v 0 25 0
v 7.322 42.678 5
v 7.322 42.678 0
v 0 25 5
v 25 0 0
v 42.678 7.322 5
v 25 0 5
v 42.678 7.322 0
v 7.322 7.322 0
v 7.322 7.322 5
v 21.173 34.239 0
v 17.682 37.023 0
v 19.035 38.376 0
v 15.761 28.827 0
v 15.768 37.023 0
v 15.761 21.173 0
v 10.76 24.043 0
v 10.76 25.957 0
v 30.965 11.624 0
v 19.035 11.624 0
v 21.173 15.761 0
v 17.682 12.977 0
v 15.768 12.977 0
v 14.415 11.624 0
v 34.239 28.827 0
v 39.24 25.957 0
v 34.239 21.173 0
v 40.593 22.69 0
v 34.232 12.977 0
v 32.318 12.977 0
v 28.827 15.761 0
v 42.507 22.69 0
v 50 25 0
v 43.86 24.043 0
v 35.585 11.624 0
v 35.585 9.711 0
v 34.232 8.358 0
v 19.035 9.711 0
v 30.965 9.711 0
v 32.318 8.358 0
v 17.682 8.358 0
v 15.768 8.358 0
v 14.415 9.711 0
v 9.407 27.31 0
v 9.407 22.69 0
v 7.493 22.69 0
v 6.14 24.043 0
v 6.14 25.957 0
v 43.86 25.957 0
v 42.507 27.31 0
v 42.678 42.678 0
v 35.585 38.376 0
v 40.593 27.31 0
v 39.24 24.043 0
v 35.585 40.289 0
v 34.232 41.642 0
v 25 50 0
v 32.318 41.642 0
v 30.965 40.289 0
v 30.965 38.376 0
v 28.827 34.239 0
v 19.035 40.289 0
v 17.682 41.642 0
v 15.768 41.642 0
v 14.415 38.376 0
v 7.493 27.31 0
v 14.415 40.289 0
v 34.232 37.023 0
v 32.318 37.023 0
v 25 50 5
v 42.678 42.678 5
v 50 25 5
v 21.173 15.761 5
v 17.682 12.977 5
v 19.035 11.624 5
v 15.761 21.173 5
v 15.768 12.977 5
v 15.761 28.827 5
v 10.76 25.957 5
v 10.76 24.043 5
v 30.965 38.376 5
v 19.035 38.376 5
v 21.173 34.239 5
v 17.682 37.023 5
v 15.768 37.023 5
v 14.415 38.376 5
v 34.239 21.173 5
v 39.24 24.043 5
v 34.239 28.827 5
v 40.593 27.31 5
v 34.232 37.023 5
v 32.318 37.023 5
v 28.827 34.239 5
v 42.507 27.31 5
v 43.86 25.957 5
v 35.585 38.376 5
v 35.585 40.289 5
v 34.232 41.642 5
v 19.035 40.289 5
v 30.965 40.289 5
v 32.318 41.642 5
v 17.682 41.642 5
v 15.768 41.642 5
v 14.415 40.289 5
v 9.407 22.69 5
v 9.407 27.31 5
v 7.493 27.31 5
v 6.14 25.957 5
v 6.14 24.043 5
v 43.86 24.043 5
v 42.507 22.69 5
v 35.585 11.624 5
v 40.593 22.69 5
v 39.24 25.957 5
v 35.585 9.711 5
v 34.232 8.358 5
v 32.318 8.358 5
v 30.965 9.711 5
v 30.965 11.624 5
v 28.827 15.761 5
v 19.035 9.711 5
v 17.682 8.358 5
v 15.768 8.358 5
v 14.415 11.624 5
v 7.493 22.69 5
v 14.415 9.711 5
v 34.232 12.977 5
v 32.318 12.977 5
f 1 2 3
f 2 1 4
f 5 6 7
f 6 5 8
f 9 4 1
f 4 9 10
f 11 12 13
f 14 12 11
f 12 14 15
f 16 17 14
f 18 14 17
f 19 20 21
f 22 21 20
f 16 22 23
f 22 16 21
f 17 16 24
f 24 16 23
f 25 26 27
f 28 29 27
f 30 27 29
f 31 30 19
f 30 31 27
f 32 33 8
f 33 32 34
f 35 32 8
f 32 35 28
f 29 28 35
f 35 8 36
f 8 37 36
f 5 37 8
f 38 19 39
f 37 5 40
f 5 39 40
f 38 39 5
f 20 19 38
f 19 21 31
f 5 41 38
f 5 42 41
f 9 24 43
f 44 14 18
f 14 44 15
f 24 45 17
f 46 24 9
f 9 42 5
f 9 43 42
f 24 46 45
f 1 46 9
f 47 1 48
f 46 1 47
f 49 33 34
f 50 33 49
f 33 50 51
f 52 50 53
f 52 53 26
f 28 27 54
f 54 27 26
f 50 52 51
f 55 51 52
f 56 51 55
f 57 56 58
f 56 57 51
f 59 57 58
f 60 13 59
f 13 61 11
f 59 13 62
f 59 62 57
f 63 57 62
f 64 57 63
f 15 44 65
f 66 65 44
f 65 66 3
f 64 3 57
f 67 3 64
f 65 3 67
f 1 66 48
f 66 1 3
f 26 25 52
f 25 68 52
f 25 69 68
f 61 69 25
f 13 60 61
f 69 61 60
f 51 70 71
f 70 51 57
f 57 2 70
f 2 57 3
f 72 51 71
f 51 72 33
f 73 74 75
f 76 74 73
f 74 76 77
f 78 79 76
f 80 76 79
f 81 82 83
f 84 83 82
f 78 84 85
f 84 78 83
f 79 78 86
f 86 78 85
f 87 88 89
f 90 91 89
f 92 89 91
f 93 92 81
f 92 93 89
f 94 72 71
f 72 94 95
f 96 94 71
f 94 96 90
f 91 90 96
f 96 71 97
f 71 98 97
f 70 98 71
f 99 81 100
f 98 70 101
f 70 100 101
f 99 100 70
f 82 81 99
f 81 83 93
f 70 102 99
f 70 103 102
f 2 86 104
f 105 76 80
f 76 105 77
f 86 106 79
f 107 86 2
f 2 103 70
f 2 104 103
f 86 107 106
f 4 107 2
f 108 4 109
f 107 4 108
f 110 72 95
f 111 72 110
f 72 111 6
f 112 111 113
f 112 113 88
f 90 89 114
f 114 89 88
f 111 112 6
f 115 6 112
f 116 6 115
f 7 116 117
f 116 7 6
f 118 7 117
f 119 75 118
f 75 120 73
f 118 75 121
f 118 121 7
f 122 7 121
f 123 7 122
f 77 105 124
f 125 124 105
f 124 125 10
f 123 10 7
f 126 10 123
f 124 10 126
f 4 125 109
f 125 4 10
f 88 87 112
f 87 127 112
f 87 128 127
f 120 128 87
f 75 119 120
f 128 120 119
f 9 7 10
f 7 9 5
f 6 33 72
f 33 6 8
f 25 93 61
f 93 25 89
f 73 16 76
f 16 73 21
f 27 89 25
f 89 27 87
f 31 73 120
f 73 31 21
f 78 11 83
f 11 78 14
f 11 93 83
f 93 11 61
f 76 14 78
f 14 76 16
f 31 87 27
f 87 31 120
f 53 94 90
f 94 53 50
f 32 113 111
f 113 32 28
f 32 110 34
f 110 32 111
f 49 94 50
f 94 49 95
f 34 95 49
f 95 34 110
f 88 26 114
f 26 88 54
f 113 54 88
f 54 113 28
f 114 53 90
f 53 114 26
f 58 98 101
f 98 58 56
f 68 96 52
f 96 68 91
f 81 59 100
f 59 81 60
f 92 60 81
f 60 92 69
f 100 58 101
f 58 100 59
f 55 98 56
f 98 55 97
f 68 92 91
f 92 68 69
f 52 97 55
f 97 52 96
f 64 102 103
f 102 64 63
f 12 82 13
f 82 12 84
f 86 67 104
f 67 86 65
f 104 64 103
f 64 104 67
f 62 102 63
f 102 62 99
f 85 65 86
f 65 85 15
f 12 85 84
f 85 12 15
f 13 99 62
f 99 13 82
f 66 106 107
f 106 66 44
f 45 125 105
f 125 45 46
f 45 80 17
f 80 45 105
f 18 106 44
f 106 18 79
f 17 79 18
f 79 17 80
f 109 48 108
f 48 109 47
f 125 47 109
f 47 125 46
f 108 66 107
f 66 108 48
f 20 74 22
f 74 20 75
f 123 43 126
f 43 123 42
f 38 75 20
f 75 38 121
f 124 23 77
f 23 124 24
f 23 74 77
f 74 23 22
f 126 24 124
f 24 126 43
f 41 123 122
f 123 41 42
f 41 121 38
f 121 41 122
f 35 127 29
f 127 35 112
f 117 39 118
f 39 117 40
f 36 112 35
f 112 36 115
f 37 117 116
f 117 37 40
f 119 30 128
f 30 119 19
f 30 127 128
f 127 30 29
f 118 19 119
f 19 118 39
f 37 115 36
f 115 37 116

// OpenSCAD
$fn = 32;

// ----------------------------------------------------------------------
// Polygon plate: 8-gon R25, 6 bolt windows
// ----------------------------------------------------------------------

// --- parameters (mm) ---
sides = 8;                // number of polygon sides
plate_r = 25;             // circumscribed radius of the polygon
bore_r = 10;              // centre bore radius
bolts = 6;                // number of bolt windows
ring_r = 16.55;           // bolt-circle radius
bolt_r = 2.5;             // bolt window radius
plate_t = 5;              // plate thickness, Z (extrusion height)

plate_d = 2 * plate_r;  // circumscribed diameter
bore_d = 2 * bore_r;  // centre bore diameter
bolt_d = 2 * bolt_r;  // bolt window diameter
ring_d = 2 * ring_r;  // bolt-circle diameter

profile = [[50, 25], [42.678, 42.678], [25, 50], [7.322, 42.678], [0, 25], [7.322, 7.322], [25, 0], [42.678, 7.322]];  // primary outline, 8 points, counter clockwise
void_1 = [[34.239, 28.827], [28.827, 34.239], [21.173, 34.239], [15.761, 28.827], [15.761, 21.173], [21.173, 15.761], [28.827, 15.761], [34.239, 21.173]];  // centre bore, 8 points
void_2 = [[43.86, 25.957], [42.507, 27.31], [40.593, 27.31], [39.24, 25.957], [39.24, 24.043], [40.593, 22.69], [42.507, 22.69], [43.86, 24.043]];  // bolt window 1, 8 points
void_3 = [[35.585, 40.289], [34.232, 41.642], [32.318, 41.642], [30.965, 40.289], [30.965, 38.376], [32.318, 37.023], [34.232, 37.023], [35.585, 38.376]];  // bolt window 2, 8 points
void_4 = [[19.035, 40.289], [17.682, 41.642], [15.768, 41.642], [14.415, 40.289], [14.415, 38.376], [15.768, 37.023], [17.682, 37.023], [19.035, 38.376]];  // bolt window 3, 8 points
void_5 = [[10.76, 25.957], [9.407, 27.31], [7.493, 27.31], [6.14, 25.957], [6.14, 24.043], [7.493, 22.69], [9.407, 22.69], [10.76, 24.043]];  // bolt window 4, 8 points
void_6 = [[19.035, 11.624], [17.682, 12.977], [15.768, 12.977], [14.415, 11.624], [14.415, 9.711], [15.768, 8.358], [17.682, 8.358], [19.035, 9.711]];  // bolt window 5, 8 points
void_7 = [[35.585, 11.624], [34.232, 12.977], [32.318, 12.977], [30.965, 11.624], [30.965, 9.711], [32.318, 8.358], [34.232, 8.358], [35.585, 9.711]];  // bolt window 6, 8 points

// --- the one profile operation ---
difference() {
  linear_extrude(height = plate_t) polygon(points = profile);
  translate([0, 0, -1])
    linear_extrude(height = plate_t + 2) polygon(points = void_1);
  translate([0, 0, -1])
    linear_extrude(height = plate_t + 2) polygon(points = void_2);
  translate([0, 0, -1])
    linear_extrude(height = plate_t + 2) polygon(points = void_3);
  translate([0, 0, -1])
    linear_extrude(height = plate_t + 2) polygon(points = void_4);
  translate([0, 0, -1])
    linear_extrude(height = plate_t + 2) polygon(points = void_5);
  translate([0, 0, -1])
    linear_extrude(height = plate_t + 2) polygon(points = void_6);
  translate([0, 0, -1])
    linear_extrude(height = plate_t + 2) polygon(points = void_7);
}
